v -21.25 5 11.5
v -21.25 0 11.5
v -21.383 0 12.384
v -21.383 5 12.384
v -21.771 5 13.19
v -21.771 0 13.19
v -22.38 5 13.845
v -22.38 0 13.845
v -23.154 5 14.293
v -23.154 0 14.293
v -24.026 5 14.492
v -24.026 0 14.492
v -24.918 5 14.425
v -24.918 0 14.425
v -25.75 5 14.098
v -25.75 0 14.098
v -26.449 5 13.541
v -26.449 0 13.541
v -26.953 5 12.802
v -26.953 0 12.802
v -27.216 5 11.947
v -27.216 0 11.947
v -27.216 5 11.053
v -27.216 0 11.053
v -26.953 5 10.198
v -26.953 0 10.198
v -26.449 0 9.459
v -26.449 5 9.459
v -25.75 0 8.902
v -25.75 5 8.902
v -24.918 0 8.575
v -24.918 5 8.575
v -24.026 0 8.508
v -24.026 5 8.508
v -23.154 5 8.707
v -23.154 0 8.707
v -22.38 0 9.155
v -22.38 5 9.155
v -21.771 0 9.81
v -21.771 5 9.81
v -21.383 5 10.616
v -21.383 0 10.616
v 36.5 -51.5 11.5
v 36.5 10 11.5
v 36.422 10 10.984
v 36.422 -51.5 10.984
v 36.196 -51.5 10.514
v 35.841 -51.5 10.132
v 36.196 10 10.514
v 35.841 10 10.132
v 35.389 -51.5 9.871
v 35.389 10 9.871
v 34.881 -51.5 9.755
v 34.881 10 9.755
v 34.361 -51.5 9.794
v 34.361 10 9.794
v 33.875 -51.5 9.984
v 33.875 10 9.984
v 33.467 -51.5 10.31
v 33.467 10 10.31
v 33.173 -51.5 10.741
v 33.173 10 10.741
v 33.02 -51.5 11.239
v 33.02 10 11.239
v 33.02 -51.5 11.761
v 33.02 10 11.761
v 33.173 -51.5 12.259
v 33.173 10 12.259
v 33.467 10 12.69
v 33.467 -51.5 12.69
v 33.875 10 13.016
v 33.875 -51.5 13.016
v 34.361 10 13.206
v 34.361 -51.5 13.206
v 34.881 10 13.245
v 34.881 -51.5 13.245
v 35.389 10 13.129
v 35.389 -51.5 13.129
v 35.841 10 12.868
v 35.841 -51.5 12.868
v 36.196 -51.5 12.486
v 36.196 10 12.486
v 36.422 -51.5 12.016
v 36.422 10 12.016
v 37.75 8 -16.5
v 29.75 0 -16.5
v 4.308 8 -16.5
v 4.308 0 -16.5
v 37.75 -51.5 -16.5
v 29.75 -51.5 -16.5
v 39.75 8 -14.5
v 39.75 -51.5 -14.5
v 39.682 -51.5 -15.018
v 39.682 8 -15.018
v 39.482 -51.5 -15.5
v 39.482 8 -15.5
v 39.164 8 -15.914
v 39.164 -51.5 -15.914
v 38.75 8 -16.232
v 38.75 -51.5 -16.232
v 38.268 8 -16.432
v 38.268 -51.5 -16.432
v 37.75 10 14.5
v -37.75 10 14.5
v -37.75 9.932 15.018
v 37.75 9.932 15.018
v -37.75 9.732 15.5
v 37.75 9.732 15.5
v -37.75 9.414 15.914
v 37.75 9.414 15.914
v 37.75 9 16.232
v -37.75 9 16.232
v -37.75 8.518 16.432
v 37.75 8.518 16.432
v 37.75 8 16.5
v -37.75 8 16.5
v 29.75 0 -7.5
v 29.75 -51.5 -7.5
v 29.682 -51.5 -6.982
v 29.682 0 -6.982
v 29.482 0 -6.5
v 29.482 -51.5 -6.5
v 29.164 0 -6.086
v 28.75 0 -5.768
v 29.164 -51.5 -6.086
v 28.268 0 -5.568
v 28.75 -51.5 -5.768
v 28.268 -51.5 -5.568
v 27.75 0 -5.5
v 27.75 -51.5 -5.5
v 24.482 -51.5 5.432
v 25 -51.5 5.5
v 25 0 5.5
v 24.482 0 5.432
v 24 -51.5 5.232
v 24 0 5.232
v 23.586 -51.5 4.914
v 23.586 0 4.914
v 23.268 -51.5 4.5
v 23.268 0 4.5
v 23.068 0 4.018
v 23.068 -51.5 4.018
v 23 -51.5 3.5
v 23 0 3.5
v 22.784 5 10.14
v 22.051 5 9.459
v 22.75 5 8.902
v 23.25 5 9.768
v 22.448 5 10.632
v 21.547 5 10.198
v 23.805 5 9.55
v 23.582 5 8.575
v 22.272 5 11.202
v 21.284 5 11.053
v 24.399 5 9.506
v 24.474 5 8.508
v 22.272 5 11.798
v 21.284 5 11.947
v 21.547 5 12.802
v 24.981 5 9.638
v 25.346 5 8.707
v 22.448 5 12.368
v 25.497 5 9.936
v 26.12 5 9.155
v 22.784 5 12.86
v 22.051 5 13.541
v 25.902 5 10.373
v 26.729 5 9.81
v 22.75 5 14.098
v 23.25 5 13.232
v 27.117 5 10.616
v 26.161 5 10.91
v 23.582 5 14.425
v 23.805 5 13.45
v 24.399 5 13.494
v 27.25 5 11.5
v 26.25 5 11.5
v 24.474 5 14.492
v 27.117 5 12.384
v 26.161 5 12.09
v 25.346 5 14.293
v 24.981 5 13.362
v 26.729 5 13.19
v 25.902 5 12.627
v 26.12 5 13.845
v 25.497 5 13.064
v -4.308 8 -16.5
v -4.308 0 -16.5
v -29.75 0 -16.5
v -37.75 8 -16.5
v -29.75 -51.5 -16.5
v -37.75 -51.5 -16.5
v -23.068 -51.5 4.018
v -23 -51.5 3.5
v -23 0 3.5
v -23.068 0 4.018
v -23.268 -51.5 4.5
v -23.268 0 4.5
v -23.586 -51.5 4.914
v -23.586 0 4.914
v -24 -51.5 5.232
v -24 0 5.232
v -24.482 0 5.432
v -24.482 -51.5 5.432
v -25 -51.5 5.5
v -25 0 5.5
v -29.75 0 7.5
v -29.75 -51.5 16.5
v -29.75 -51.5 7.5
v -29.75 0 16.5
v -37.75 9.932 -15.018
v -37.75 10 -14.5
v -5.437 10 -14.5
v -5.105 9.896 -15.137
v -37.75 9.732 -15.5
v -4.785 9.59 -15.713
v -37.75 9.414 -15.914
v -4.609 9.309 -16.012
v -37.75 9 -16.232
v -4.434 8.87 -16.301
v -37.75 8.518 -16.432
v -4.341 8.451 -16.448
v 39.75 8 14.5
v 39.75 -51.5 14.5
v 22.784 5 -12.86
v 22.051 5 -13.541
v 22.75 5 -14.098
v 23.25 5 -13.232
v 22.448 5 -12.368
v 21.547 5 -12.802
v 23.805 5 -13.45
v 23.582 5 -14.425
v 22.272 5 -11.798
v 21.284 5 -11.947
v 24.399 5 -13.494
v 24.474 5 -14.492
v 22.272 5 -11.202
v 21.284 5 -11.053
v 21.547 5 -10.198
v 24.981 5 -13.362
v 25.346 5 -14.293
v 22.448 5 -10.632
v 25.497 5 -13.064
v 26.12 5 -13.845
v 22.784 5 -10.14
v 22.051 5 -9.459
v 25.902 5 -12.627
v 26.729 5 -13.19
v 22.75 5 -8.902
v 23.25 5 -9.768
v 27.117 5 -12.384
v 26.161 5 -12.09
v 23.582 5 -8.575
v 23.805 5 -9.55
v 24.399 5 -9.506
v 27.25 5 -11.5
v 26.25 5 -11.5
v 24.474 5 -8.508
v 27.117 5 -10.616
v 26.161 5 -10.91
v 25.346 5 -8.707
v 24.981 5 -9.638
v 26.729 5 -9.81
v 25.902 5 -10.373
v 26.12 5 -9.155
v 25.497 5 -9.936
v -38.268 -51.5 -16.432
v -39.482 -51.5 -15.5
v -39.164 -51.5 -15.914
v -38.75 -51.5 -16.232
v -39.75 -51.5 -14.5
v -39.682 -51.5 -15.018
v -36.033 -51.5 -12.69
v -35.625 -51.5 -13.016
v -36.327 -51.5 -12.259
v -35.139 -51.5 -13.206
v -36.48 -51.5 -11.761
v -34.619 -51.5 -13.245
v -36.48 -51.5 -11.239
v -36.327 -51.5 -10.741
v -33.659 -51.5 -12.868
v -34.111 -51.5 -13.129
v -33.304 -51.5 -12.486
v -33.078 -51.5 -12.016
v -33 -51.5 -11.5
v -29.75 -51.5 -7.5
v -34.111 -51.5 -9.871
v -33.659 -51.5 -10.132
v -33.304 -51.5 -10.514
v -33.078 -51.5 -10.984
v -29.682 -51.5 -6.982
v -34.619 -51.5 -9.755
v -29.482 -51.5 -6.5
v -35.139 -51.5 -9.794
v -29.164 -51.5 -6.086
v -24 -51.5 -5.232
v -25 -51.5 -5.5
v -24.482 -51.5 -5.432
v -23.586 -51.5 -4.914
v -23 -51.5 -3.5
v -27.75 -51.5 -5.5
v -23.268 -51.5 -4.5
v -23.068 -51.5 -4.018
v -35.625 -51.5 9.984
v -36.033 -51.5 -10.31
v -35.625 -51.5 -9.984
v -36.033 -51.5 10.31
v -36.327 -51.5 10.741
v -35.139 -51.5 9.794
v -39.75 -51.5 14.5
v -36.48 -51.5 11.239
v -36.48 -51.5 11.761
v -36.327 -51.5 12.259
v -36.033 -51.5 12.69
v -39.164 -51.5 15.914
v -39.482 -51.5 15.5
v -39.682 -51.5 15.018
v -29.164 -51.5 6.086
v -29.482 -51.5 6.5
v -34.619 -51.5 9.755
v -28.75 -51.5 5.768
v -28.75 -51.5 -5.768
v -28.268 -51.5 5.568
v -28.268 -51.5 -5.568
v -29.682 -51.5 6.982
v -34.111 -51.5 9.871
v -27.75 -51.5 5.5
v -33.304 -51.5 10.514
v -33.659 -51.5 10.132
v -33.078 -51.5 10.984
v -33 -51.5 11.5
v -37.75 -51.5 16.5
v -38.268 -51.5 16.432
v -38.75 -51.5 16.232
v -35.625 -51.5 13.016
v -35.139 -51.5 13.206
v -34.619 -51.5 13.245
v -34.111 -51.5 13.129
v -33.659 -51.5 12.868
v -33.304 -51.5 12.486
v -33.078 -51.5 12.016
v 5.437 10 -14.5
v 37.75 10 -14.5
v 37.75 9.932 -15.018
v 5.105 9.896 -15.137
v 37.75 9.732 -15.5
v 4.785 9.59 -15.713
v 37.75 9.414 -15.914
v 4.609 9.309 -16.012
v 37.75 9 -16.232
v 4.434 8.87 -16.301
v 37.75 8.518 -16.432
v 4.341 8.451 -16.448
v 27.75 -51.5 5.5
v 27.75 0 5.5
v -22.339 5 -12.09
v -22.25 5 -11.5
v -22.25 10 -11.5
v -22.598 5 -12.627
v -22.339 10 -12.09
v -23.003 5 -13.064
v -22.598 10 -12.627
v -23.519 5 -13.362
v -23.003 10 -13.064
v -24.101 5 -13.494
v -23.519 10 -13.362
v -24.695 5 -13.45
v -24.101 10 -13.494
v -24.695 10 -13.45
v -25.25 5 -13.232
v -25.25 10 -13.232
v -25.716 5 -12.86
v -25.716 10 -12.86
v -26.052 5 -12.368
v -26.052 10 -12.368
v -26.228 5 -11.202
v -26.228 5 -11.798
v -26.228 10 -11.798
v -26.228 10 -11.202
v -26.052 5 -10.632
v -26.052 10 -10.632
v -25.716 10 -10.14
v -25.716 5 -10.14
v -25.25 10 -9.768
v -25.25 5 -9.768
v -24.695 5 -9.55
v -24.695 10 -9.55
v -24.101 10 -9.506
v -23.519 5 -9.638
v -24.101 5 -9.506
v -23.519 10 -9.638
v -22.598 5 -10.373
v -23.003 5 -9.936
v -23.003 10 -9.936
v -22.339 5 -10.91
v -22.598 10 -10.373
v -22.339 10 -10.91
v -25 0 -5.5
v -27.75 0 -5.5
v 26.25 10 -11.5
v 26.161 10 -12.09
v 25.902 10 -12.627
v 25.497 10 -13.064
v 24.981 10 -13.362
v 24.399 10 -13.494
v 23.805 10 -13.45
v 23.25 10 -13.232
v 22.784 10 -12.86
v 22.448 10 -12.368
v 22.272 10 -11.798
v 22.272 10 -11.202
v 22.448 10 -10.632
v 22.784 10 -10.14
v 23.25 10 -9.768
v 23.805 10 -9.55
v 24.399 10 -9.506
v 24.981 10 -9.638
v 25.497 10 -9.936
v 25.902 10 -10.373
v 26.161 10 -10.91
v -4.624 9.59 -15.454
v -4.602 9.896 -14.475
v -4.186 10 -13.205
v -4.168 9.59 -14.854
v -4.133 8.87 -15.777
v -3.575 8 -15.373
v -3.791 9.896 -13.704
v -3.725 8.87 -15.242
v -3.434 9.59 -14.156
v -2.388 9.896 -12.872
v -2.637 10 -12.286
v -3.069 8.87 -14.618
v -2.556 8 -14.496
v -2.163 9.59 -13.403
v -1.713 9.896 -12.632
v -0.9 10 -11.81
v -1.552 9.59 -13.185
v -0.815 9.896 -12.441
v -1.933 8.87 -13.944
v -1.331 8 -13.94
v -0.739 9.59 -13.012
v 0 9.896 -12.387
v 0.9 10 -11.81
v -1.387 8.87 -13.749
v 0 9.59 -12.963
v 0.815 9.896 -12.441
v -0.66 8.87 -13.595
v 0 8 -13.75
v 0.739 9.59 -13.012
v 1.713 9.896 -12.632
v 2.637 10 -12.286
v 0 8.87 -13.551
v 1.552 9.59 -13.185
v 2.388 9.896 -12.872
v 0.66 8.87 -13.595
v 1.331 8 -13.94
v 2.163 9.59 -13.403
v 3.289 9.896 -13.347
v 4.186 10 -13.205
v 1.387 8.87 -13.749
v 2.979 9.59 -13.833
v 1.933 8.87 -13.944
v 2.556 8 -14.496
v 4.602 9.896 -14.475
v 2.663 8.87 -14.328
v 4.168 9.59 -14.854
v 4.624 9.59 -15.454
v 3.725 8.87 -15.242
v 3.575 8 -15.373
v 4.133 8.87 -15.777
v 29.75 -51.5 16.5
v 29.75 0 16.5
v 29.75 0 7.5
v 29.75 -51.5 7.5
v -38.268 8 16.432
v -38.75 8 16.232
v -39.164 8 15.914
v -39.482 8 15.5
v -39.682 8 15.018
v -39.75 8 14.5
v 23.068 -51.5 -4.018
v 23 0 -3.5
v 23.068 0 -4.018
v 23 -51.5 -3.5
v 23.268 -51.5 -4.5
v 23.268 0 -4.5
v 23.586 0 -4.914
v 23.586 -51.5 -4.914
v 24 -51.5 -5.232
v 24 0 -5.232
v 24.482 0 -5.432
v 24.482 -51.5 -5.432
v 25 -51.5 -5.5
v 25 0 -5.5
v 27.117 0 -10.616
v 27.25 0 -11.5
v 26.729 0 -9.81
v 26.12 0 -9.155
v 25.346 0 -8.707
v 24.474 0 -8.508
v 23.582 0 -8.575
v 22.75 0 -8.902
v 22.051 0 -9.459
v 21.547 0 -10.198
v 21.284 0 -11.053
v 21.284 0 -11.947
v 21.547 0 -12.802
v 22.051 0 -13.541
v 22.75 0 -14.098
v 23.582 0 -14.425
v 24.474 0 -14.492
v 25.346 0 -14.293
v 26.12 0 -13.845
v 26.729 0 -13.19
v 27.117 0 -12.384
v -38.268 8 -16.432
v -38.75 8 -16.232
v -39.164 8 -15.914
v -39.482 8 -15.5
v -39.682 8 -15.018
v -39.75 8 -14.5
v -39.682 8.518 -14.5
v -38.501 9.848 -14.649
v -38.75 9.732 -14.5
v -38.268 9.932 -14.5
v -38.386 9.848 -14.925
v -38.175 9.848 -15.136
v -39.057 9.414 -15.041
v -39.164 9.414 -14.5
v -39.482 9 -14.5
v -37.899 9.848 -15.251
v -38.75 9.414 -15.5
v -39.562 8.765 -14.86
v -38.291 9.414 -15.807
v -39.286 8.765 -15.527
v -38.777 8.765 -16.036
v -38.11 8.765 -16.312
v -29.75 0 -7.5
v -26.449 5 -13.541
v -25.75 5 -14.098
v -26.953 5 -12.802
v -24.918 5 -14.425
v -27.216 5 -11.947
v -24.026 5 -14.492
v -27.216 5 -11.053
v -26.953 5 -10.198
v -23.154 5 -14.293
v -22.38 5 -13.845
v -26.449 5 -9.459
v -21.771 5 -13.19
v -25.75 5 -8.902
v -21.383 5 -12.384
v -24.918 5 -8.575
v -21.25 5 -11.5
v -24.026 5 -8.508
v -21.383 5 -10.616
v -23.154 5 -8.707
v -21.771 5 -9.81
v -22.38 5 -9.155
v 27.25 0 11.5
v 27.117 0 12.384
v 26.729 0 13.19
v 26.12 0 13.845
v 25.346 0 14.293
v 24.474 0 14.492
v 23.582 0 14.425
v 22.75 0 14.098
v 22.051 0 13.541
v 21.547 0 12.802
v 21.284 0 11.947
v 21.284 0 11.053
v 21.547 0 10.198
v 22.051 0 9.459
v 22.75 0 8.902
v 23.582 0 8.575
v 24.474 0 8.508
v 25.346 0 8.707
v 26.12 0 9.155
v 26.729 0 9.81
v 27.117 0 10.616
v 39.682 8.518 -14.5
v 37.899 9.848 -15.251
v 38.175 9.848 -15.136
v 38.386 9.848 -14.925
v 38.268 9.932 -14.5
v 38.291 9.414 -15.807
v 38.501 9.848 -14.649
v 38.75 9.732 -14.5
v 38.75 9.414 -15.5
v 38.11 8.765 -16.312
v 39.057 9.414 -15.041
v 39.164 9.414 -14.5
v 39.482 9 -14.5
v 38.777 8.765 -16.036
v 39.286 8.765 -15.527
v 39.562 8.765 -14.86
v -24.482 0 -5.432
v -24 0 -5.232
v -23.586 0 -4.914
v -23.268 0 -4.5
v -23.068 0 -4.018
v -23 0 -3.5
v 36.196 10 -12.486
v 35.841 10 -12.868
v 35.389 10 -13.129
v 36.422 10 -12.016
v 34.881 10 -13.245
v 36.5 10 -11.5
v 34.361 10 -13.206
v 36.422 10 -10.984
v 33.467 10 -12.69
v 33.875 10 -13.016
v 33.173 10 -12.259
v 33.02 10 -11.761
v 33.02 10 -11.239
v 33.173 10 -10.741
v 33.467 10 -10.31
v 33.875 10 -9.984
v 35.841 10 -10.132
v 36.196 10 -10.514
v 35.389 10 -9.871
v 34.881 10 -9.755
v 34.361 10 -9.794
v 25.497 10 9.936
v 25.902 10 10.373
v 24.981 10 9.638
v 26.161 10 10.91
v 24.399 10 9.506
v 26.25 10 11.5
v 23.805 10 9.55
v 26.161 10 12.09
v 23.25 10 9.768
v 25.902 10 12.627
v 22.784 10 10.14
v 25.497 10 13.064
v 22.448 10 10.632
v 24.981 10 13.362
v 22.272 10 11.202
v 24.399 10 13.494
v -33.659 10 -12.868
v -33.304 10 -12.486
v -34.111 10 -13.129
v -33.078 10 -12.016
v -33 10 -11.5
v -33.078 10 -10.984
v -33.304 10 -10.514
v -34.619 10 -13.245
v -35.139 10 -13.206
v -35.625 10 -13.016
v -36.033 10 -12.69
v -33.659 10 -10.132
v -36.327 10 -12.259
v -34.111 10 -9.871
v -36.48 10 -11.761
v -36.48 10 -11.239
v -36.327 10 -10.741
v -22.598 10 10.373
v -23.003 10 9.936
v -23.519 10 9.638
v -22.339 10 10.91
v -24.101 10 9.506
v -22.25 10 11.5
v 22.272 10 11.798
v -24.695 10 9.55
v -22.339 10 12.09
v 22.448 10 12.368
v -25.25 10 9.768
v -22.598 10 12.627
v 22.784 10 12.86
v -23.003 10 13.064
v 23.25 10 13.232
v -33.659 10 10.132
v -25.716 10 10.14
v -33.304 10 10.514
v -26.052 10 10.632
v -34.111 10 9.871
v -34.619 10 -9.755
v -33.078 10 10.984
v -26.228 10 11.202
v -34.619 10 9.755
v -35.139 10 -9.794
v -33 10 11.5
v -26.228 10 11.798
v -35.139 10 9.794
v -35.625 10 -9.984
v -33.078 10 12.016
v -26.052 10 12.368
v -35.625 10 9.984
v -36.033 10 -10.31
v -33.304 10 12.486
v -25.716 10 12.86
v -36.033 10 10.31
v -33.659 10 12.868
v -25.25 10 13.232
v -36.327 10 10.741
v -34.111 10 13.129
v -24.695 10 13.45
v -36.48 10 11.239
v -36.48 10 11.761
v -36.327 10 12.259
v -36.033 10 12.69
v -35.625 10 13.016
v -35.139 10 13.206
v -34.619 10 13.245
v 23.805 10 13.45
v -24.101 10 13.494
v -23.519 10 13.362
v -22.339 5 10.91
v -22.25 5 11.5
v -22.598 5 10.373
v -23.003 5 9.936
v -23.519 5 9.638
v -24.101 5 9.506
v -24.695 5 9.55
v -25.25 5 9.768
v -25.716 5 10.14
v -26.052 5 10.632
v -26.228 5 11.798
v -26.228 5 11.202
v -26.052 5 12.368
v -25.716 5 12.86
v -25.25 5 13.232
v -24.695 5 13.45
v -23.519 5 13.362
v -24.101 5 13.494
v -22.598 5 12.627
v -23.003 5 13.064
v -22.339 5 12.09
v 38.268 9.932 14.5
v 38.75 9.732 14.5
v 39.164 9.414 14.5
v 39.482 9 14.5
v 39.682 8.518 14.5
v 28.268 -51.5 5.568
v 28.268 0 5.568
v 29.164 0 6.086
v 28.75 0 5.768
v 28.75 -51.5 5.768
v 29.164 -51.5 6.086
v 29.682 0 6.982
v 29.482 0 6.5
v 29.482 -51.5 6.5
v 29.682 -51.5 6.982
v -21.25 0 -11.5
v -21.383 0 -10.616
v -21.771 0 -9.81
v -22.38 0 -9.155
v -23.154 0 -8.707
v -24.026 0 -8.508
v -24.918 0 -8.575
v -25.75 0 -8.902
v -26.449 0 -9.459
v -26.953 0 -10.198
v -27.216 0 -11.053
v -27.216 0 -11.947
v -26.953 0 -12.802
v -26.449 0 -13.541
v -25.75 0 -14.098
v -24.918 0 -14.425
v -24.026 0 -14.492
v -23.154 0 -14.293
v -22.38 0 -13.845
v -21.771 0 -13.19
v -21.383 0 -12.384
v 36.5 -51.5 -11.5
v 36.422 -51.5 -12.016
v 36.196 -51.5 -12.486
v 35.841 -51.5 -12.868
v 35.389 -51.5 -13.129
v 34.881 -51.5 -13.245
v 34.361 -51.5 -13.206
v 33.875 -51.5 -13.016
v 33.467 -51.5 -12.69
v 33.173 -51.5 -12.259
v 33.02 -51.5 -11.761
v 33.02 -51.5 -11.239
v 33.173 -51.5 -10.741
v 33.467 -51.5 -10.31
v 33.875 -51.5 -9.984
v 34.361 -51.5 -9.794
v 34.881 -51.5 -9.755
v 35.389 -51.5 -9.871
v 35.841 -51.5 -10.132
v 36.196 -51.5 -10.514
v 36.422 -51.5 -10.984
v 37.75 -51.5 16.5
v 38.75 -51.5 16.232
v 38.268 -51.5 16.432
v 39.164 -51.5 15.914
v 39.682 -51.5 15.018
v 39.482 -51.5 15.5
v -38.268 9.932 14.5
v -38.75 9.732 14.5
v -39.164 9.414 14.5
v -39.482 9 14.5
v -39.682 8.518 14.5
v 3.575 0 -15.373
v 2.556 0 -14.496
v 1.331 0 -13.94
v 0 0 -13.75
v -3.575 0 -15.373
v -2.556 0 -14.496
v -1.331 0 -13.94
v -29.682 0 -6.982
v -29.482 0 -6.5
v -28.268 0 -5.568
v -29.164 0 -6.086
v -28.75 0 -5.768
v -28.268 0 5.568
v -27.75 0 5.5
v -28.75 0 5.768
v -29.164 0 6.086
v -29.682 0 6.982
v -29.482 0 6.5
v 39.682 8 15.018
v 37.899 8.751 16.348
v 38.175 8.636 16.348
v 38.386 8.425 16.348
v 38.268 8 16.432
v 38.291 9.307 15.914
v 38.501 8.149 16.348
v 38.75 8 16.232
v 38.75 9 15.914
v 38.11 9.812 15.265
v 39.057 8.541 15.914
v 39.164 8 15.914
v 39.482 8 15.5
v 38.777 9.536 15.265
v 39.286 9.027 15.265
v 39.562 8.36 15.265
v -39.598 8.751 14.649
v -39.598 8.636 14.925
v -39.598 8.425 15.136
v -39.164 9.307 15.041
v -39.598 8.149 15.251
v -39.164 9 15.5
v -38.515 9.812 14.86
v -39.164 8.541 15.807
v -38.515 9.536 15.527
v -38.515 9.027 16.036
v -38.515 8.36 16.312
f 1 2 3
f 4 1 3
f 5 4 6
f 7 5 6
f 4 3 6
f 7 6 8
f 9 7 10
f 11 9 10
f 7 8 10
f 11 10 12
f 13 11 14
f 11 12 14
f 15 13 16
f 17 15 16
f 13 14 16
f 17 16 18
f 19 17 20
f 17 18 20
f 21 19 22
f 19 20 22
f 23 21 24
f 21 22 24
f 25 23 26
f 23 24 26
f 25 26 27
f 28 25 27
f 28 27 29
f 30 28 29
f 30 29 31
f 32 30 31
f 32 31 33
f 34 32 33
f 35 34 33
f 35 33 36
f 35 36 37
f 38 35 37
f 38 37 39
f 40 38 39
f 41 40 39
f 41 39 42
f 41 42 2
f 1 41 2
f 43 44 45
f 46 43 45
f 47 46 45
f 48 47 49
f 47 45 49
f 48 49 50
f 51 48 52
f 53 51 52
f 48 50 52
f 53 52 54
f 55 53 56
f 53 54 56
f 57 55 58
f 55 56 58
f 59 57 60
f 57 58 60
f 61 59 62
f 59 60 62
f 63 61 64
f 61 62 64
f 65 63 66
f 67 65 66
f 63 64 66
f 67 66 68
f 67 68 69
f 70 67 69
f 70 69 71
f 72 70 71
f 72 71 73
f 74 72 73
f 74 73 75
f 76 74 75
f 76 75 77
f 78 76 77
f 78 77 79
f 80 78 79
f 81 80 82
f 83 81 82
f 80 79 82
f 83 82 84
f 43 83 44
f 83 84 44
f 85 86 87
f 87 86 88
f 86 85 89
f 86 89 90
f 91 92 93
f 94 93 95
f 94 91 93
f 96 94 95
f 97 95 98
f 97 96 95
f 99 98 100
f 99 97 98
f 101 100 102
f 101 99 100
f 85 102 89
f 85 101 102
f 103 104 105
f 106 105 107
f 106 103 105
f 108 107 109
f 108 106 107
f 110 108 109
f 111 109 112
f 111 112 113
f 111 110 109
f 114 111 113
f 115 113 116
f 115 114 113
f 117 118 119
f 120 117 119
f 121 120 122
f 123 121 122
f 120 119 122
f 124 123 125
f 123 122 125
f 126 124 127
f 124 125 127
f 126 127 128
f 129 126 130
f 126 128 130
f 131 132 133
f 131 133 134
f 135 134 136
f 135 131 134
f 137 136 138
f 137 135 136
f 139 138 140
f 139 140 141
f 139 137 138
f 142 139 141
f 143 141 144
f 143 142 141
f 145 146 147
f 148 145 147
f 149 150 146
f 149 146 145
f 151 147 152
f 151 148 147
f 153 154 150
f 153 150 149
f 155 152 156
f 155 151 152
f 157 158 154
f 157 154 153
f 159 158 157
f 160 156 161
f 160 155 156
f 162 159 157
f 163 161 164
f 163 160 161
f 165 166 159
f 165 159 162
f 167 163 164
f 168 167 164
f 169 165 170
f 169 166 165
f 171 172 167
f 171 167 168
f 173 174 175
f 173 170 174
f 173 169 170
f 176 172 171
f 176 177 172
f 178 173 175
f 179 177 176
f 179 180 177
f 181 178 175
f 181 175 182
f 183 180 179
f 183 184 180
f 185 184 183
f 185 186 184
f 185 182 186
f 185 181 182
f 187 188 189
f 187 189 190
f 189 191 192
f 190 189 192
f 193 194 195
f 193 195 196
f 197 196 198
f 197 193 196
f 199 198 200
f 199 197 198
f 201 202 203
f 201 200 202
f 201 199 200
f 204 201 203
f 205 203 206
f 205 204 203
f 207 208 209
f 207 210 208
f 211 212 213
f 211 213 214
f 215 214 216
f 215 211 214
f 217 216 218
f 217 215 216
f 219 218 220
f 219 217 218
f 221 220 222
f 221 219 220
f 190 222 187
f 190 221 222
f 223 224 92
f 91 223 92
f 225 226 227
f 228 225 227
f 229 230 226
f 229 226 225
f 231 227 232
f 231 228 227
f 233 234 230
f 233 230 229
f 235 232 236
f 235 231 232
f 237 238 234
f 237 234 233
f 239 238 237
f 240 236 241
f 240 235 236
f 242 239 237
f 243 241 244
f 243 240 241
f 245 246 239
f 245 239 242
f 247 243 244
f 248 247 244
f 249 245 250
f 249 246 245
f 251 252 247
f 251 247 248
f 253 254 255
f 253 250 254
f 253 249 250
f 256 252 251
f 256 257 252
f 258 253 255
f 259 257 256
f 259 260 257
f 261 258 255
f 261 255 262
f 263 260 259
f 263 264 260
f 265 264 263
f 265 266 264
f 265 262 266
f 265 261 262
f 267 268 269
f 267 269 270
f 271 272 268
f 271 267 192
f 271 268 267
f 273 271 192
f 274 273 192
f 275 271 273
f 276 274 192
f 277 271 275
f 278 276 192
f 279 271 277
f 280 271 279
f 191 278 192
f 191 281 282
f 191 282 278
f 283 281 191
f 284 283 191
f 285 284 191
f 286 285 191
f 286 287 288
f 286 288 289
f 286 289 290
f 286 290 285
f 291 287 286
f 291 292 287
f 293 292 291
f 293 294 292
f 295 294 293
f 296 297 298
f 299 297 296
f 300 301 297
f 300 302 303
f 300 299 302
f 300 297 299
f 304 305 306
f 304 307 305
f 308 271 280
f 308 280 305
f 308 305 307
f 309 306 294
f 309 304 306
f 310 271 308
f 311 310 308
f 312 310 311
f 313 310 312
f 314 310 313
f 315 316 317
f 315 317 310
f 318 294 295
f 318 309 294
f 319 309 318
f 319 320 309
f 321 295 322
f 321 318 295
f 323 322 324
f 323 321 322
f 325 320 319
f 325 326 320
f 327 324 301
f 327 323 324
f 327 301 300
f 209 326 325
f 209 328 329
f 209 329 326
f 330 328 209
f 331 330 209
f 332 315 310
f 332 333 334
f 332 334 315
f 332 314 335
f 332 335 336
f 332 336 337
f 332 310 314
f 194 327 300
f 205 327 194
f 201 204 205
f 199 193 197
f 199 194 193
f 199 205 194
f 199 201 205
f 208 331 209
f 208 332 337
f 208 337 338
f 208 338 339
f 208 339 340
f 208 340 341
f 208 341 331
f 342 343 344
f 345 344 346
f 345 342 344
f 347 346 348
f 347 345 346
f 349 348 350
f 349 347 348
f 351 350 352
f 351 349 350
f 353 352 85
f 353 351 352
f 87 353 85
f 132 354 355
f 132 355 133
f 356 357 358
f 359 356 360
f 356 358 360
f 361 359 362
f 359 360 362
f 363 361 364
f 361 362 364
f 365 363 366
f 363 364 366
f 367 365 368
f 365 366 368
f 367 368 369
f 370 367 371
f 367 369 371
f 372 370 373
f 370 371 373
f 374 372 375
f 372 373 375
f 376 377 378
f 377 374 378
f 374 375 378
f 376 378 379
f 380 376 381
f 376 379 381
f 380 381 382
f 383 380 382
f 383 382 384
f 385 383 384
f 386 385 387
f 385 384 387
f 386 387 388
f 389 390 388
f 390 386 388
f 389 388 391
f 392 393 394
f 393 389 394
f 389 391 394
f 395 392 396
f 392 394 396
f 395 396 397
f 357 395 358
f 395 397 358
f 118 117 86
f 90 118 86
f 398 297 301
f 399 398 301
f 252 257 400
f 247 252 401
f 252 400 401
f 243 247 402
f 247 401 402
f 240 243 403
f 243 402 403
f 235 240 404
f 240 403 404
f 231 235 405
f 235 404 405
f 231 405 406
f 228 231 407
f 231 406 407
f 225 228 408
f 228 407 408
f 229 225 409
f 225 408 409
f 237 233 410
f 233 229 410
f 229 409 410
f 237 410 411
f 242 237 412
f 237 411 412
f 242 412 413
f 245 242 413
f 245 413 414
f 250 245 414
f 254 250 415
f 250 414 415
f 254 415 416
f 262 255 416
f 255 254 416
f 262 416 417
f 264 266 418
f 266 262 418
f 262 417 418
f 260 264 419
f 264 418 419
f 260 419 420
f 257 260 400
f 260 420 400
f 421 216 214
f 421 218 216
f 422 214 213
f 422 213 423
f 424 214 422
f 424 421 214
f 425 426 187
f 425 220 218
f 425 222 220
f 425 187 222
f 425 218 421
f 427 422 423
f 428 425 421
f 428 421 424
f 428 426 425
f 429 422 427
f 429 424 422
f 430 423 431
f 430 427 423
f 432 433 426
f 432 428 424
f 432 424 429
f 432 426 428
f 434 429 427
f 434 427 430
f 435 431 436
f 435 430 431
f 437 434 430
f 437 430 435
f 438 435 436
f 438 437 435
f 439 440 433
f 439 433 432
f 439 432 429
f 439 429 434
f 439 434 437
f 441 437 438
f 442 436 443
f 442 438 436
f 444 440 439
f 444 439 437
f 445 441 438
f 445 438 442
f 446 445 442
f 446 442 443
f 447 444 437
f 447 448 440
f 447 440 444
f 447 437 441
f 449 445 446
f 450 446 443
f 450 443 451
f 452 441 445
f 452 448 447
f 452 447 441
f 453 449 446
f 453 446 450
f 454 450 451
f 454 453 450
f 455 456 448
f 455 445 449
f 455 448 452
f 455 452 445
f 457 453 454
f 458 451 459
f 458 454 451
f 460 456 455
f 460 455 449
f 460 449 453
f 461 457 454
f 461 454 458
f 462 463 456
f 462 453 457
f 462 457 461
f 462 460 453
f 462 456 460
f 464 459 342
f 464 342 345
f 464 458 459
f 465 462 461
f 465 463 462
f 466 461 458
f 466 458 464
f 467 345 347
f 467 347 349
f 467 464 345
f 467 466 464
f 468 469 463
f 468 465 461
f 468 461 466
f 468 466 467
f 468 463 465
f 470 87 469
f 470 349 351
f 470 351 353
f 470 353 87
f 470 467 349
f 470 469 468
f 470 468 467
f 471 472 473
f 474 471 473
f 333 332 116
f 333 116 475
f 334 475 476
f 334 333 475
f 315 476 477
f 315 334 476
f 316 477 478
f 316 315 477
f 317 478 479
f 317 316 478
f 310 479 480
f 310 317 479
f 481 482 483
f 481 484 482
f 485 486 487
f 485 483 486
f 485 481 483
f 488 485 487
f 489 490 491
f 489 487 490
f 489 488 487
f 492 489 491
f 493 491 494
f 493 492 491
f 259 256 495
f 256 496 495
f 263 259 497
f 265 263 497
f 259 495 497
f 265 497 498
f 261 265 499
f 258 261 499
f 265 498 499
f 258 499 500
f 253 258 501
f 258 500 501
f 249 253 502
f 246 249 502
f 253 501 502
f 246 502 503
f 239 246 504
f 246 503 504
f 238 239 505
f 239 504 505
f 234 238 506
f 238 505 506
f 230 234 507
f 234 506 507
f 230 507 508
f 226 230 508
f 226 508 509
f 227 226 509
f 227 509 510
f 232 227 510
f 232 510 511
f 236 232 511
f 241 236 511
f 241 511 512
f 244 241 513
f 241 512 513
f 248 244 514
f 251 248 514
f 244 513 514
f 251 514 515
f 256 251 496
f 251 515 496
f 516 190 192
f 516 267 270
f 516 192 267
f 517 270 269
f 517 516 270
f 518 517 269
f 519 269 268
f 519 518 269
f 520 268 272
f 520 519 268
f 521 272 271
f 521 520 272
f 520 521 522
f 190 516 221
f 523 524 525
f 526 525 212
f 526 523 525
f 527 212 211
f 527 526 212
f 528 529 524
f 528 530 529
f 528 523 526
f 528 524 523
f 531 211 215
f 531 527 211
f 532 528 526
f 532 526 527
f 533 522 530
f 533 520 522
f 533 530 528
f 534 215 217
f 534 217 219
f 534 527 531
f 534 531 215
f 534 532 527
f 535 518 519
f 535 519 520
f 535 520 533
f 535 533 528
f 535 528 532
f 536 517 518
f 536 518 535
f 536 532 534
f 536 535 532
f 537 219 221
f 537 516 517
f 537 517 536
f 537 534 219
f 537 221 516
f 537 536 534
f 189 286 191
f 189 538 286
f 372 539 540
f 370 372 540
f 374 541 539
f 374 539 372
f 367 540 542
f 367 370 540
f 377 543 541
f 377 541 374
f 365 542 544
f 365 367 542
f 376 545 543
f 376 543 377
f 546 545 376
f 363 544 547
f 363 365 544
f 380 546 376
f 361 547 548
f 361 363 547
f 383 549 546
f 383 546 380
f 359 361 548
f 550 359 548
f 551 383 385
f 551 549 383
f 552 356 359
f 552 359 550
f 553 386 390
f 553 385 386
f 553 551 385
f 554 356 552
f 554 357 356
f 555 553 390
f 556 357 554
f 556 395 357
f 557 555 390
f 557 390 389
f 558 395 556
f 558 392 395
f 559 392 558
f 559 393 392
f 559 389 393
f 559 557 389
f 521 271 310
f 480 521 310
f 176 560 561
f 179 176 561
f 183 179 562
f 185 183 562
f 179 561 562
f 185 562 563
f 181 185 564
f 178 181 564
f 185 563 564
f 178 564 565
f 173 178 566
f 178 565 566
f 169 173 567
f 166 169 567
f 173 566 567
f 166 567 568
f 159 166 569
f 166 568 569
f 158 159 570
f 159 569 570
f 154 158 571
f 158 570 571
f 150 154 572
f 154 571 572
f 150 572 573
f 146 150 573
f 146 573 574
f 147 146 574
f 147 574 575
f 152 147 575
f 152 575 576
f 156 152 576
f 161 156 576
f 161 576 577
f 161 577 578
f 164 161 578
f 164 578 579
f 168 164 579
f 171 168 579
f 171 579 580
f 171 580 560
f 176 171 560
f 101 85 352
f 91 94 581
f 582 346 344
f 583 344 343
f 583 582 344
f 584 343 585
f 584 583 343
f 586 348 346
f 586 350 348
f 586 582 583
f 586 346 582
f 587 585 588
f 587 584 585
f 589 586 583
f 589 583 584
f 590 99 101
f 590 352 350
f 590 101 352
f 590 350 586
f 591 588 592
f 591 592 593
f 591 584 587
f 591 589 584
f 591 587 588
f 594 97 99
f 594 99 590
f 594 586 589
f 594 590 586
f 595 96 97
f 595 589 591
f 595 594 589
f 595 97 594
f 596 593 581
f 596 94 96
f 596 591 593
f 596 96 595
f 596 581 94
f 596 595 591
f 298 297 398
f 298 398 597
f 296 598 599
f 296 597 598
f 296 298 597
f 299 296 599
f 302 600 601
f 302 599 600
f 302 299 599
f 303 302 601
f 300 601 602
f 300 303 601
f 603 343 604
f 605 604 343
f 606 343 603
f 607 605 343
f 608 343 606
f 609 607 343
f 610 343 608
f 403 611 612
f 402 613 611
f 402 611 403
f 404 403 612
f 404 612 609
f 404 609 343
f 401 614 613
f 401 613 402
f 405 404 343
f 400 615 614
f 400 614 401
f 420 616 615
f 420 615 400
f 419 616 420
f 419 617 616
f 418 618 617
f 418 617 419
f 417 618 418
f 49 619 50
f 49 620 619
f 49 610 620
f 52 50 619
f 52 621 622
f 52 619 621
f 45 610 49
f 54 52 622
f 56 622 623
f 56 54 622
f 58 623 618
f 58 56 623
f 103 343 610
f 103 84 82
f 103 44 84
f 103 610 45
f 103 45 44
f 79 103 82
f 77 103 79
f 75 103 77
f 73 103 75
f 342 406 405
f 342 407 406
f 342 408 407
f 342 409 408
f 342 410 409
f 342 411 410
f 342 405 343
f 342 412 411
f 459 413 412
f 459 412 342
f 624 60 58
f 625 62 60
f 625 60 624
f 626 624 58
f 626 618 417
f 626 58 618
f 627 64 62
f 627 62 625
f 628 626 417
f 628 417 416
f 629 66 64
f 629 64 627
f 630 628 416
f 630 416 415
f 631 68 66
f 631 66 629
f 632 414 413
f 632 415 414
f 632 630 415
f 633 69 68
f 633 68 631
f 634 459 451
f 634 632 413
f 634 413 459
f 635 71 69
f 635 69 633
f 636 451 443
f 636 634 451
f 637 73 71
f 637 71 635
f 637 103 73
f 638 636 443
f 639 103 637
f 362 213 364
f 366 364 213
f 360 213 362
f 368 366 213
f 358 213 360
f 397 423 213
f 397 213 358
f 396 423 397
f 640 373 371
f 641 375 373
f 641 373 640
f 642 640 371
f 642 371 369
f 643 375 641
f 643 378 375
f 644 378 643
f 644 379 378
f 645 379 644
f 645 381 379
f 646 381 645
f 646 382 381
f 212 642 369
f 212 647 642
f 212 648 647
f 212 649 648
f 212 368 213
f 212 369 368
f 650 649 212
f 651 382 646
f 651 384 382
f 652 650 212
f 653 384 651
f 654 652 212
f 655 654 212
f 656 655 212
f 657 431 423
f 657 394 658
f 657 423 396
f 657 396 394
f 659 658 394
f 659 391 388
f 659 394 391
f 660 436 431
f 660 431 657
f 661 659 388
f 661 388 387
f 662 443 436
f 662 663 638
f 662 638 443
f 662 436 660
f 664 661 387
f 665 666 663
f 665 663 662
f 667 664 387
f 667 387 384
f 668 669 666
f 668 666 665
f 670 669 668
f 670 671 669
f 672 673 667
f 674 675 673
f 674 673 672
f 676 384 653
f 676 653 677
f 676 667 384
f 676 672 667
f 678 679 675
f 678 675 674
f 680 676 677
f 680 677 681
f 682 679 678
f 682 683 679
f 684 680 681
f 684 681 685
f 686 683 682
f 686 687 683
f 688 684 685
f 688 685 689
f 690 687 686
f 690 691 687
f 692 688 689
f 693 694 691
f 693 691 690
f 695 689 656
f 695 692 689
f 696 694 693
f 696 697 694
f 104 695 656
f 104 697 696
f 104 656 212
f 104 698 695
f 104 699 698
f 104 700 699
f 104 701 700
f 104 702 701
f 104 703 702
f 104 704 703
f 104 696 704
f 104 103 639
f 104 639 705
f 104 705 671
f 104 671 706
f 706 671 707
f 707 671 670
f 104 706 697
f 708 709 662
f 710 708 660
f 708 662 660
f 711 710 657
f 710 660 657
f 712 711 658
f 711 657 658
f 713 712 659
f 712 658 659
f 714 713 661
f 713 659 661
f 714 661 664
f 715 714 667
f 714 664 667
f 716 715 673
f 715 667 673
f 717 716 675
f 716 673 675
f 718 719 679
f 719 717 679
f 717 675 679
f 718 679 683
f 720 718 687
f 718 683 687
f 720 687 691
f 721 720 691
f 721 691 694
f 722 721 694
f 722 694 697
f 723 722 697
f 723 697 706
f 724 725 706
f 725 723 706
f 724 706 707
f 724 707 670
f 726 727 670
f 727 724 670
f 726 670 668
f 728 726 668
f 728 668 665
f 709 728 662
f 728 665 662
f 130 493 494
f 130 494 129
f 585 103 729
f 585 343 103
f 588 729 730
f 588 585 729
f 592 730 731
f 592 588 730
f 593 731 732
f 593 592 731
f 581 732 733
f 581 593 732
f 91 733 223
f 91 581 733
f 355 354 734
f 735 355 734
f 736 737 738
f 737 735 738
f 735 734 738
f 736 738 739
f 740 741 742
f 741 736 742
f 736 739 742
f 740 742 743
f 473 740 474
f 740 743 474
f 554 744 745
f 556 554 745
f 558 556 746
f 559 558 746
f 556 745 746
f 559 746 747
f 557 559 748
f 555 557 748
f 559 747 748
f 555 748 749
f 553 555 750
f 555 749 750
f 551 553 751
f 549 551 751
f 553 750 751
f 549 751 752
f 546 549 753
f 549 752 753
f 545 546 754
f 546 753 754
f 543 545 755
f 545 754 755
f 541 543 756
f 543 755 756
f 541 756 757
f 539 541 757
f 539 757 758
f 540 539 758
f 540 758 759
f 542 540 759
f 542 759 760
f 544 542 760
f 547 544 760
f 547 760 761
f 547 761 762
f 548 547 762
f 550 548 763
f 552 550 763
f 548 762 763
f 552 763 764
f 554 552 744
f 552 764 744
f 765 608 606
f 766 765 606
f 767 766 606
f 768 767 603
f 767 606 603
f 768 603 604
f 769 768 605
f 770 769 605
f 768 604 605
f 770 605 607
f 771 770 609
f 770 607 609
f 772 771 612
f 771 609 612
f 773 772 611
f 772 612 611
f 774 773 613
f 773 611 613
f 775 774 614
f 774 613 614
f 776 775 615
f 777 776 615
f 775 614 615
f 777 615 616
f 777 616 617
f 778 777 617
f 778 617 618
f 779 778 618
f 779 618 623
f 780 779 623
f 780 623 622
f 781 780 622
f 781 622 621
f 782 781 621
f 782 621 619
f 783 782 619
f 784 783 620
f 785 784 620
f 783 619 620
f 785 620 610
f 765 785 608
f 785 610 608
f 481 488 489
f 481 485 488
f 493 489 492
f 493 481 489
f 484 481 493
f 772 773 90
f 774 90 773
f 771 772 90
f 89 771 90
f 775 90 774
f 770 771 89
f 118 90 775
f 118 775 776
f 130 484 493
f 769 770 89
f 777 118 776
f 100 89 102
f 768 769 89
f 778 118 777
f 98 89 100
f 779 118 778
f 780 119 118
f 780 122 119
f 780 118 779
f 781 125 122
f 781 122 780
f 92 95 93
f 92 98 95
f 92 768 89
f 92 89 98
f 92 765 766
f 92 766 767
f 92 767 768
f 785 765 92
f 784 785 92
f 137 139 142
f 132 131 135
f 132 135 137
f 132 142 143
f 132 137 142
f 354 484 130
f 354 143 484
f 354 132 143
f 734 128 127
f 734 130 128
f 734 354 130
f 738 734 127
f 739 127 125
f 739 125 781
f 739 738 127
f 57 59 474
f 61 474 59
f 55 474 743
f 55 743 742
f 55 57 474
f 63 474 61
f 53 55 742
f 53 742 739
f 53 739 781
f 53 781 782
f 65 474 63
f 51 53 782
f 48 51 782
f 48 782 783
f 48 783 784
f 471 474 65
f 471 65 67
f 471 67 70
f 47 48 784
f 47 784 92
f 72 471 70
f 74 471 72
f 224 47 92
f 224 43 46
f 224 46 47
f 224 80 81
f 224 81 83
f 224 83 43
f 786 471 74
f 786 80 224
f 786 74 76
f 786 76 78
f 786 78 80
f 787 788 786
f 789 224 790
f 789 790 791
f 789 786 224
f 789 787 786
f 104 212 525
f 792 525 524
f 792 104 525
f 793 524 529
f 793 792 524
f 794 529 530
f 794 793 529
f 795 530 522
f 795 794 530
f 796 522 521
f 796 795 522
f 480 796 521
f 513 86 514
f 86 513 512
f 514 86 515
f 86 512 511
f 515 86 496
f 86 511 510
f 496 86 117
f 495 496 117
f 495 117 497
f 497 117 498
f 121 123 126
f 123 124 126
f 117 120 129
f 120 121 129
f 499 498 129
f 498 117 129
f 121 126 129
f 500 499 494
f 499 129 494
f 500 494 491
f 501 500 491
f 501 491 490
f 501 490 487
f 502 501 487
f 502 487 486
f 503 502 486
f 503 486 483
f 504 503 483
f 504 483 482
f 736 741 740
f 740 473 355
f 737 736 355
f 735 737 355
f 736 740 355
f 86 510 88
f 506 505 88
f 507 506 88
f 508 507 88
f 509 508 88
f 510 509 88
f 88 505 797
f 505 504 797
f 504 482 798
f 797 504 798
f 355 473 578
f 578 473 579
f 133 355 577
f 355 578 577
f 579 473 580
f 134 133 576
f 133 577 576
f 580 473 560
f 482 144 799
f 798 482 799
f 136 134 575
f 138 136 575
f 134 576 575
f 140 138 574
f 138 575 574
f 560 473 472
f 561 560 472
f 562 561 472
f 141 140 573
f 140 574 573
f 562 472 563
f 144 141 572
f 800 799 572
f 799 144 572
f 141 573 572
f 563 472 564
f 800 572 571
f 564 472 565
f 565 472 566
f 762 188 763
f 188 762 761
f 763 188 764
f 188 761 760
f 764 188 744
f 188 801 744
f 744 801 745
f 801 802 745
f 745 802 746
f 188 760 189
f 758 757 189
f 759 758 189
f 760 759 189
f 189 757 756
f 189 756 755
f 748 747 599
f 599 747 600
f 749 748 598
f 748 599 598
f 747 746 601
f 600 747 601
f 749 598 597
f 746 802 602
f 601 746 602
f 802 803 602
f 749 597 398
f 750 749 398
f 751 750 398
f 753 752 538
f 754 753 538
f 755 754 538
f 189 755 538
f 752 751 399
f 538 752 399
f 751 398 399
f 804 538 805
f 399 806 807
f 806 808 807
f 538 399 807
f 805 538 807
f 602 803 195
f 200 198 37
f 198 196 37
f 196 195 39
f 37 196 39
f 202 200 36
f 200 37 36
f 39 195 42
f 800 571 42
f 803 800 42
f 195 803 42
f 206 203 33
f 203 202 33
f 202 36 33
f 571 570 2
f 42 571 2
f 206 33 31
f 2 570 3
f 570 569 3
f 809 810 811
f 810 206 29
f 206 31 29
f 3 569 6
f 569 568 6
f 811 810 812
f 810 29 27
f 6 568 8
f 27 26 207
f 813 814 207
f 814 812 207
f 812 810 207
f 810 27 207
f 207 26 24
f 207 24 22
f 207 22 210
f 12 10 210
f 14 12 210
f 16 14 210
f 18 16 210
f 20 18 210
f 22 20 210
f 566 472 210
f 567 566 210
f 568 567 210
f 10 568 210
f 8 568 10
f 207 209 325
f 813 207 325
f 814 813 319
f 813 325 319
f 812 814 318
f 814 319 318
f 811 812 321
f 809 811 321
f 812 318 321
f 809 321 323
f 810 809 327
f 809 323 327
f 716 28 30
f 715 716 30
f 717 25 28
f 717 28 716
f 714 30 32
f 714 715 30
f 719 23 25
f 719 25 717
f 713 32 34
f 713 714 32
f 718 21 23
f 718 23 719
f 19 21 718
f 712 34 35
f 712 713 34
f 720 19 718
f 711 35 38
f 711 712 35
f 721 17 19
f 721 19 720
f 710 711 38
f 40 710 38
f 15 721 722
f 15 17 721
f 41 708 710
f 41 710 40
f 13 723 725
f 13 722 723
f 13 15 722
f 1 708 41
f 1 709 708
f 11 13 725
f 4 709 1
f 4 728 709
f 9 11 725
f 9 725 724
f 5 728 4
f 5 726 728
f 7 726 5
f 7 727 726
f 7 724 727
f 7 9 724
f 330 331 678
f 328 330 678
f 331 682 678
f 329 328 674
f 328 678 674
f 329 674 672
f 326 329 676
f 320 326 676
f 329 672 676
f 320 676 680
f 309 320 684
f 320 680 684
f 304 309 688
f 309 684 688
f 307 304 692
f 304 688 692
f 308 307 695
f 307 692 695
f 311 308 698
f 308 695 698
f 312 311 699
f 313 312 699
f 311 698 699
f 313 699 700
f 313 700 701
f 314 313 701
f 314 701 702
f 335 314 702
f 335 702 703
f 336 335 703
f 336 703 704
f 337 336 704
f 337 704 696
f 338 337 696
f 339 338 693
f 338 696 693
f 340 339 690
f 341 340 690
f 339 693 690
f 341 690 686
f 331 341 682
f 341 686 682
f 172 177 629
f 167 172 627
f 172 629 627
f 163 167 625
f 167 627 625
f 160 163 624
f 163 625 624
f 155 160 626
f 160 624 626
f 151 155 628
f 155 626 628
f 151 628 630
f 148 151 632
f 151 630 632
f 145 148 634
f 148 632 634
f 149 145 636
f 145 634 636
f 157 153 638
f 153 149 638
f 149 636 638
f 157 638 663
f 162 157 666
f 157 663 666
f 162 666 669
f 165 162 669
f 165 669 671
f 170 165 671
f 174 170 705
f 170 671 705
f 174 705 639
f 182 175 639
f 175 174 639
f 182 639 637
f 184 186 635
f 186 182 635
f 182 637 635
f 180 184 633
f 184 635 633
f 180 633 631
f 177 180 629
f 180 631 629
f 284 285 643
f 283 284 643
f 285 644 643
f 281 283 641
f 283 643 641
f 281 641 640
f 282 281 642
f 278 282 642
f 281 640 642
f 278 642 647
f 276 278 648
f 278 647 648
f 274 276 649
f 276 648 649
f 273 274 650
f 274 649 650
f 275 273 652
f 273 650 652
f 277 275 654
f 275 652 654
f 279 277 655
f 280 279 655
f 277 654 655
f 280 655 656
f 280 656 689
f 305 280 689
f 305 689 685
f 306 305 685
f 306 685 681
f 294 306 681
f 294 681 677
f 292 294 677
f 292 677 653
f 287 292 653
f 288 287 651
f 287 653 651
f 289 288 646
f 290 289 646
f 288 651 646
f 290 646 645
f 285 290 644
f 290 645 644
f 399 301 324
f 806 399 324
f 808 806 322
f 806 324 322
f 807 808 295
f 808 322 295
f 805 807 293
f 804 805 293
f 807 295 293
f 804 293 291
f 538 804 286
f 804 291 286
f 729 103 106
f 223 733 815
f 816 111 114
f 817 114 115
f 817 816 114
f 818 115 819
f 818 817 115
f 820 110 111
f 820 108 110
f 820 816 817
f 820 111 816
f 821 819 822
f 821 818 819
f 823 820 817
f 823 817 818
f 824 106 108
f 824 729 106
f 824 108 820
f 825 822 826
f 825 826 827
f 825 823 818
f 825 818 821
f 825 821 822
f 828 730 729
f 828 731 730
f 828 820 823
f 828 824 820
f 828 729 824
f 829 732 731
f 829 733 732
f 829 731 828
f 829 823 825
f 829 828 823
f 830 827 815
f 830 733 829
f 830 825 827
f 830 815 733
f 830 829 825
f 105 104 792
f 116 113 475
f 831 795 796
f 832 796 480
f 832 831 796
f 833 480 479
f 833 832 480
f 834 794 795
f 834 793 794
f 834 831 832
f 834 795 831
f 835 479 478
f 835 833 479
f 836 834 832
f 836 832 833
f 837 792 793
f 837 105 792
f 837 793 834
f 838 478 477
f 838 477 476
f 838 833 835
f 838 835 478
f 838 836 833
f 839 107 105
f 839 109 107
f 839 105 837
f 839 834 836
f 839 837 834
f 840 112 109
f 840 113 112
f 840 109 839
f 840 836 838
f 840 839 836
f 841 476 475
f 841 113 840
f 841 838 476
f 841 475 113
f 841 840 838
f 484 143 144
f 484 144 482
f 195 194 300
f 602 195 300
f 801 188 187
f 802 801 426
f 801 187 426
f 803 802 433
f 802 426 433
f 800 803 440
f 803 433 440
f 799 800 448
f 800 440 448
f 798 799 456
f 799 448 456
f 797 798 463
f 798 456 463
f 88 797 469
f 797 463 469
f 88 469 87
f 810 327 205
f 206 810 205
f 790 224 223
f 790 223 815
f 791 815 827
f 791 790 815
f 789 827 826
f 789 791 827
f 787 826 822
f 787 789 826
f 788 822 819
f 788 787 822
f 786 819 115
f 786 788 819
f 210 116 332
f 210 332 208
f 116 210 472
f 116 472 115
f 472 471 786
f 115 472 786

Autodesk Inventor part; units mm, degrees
ref_plane "YZ Plane" through (0, 0, 0) normal (1, 0, 0) x (0, 1, 0)
ref_plane "XZ Plane" through (0, 0, 0) normal (0, 1, 0) x (-1, 0, 0)
ref_plane "XY Plane" through (0, 0, 0) normal (0, 0, 1) x (1, 0, 0)
sketch "TopSketch" plane through (0, 0, 0) normal (0, 1, 0) x (-1, 0, 0)
  line L0 (-39.75, -16.5) -> (39.75, -16.5)
  line L1 (39.75, -16.5) -> (39.75, 16.5)
  line L2 (39.75, 16.5) -> (-39.75, 16.5)
  line L3 (-39.75, 16.5) -> (-39.75, -16.5)
  line L4 (-39.75, -16.5) -> (39.75, 16.5) construction
  line L5 (39.75, -16.5) -> (-39.75, 16.5) construction
  point P0 (0, 0)
  dimension "EncoderSupportOutside_Length" = 33
  dimension "EncoderSupportOutside_Width" = 79.5
extrude "Top" add sketch "TopSketch" along normal blind 10
sketch "SideSketch" plane through (0, 0, 0) normal (0, -1, 0) x (1, 0, 0)
  line L0 (39.75, -16.5) -> (-39.75, -16.5) projected
  line L1 (39.75, 16.5) -> (39.75, -16.5) projected
  line L2 (-39.75, 16.5) -> (39.75, 16.5) projected
  line L3 (-39.75, -16.5) -> (-39.75, 16.5) projected
  line L4 (-29.75, 16.5) -> (-29.75, -16.5)
  line L5 (29.75, 16.5) -> (29.75, -16.5)
  line L6 (0, 0) -> (0, 21.6169) construction
  dimension "d4" = 10
extrude "Side" add sketch "SideSketch" along normal blind 51.5 contours L0 L5 L2 L1 | L0 L3 L2 L4
sketch "CableHoleSketch" plane through (0, 10, 0) normal (0, 1, 0) x (1, 0, 0)
  line L0 (-39.75, -16.5) -> (39.75, -16.5) projected
  line L1 (39.75, -16.5) -> (39.75, 16.5) projected
  line L2 (0, 0) -> (0, 14.5107) construction
  circle A0 centre (0, 18.5) radius 4.75
  dimension "d7" = 9.5
  dimension "d8" = 35
extrude "CableHole" cut sketch "CableHoleSketch" against normal up to next
sketch "InnerFasteningHoleSketch" plane through (0, 10, 0) normal (0, 1, 0) x (1, 0, 0)
  line L0 (39.75, 16.5) -> (-39.75, 16.5) projected
  line L1 (39.75, 16.5) -> (-39.75, 16.5) projected
  circle A0 centre (-24.25, 11.5) radius 2
  line L2 (0, 0) -> (39.099, 0) construction
  line L3 (0, 0) -> (0, 35.9734) construction
  circle A1 centre (-24.25, -11.5) radius 2
  circle A2 centre (24.25, 11.5) radius 2
  circle A3 centre (24.25, -11.5) radius 2
  dimension "d11" = 4
  dimension "d12" = 5
  dimension "d13" = 24.25
extrude "InnerFasteningHole" cut sketch "InnerFasteningHoleSketch" against normal up to next
sketch "OuterFasteningHoleSketch" plane through (0, 10, 0) normal (0, 1, 0) x (1, 0, 0)
  line L0 (39.75, 16.5) -> (-39.75, 16.5) projected
  line L1 (-39.75, 16.5) -> (-39.75, -16.5) projected
  line L2 (39.75, 16.5) -> (-39.75, 16.5) projected
  circle A0 centre (-34.75, 11.5) radius 1.75
  line L3 (0, 0) -> (36.9685, 0) construction
  line L4 (0, 0) -> (0, 24.5431) construction
  circle A1 centre (34.75, 11.5) radius 1.75
  circle A2 centre (-34.75, -11.5) radius 1.75
  circle A3 centre (34.75, -11.5) radius 1.75
  dimension "d16" = 3.5
  dimension "d17" = 5
  dimension "d18" = 5
extrude "OuterFasteningHole" cut sketch "OuterFasteningHoleSketch" against normal up to next
sketch "CoilSpringHoleSketch" plane through (0, 0, 0) normal (0, -1, 0) x (1, 0, 0)
  circle A0 centre (24.25, -11.5) radius 2 projected
  circle A1 centre (-24.25, -11.5) radius 2 projected
  circle A2 centre (-24.25, 11.5) radius 2 projected
  circle A3 centre (24.25, 11.5) radius 2 projected
  line L0 (29.75, -16.5) -> (-29.75, -16.5) projected
  circle A4 centre (-24.25, 11.5) radius 3
  line L1 (0, 0) -> (0, 23.1959) construction
  line L2 (0, 0) -> (47.7515, 0) construction
  circle A5 centre (24.25, 11.5) radius 3
  circle A6 centre (-24.25, -11.5) radius 3
  circle A7 centre (24.25, -11.5) radius 3
  point P0 (-4.3084, -16.5)
  dimension "d21" = 6
extrude "CoilSpringHole" cut sketch "CoilSpringHoleSketch" against normal blind 5
sketch "Sketch7" plane through (0, 0, 0) normal (0, -1, 0) x (1, 0, 0)
  circle A0 centre (-24.25, 11.5) radius 3 projected
  arc A1 (4.3084, -16.5) -> (-4.3084, -16.5) centre (0, -18.5) ccw projected
  line L0 (-29.75, 16.5) -> (-29.75, -16.5) projected
  line L1 (-29.75, 5.5) -> (-23, 5.5)
  line L2 (-23, 5.5) -> (-23, -5.5)
  line L3 (-23, -5.5) -> (-29.75, -5.5)
  line L4 (-29.75, -5.5) -> (-29.75, 5.5)
  line L5 (0, 0) -> (50.1862, 0) construction
  line L6 (0, 0) -> (0, -18.5) construction
  line L7 (29.75, 5.5) -> (23, 5.5)
  line L8 (23, 5.5) -> (23, -5.5)
  line L9 (23, -5.5) -> (29.75, -5.5)
  line L10 (29.75, -5.5) -> (29.75, 5.5)
  circle A2 centre (-24.25, 11.5) radius 3 construction
  dimension "d25" = 3
  dimension "d26" = 23
extrude "Extrusion7" add sketch "Sketch7" along normal up to surface (51.5 mm away) contours L1 L2 L3 L0 | L10 L9 L8 L7
fillet "Fillet" radius 2 8 edges at (-29.75, -25.75, 5.5) (-23, -25.75, 5.5) (-23, -25.75, -5.5) (-29.75, -25.75, -5.5) (29.75, -25.75, 5.5) (23, -25.75, 5.5) (23, -25.75, -5.5) (29.75, -25.75, -5.5)
fillet "Fillet" radius 2 10 edges at (39.75, -20.75, -16.5) (-39.75, -20.75, -16.5) (22.0292, 10, -16.5) (0, 10, -13.75) (-22.0292, 10, -16.5) (39.75, 10, 0) (0, 10, 16.5) (-39.75, 10, 0) (-39.75, -20.75, 16.5) (39.75, -20.75, 16.5)
equation "\"EncoderSupportOutside_Length\" = EncoderSupportInside_Length"
equation "\"EncoderSupportOutside_Width\" = EncoderSupportInside_Width + 2 * EncoderSupportOutside_Thickness + 2 * EncoderSupportOutside_MecanicalSpace"
equation "\"d2\" = EncoderSupportOutside_Thickness"
equation "\"d4\" = EncoderSupportOutside_Thickness"
equation "\"d5\" = EncoderSupportInside_Height + EncoderSupport_Space"
equation "\"d7\" = Encoder_CableBase_Diameter + EncoderSupport_PlasticShrinkingMargin"
equation "\"d8\" = Encoder_CableBase_DistanceToTop + EncoderSupportInside_Front_Thickness"
equation "\"d9\" = EncoderSupportOutside_Thickness"
equation "\"d11\" = EncoderSupport_PlasticShrinkingMargin + EncoderSupport_FixingHole_Diameter + EncoderSupportOutside_MecanicalSpace"
equation "\"d12\" = EncoderSupport_FixingnHole_Margin"
equation "\"d14\" = EncoderSupportOutside_Thickness"
equation "\"d16\" = EncoderSupport_FixingHole_Diameter + EncoderSupport_PlasticShrinkingMargin"
equation "\"d17\" = EncoderSupport_FixingnHole_Margin"
equation "\"d18\" = EncoderSupport_FixingnHole_Margin"
equation "\"d19\" = EncoderSupportOutside_Thickness"
equation "\"d21\" = EncoderSupport_CoilSpringHole_Diameter"
equation "\"d25\" = EncoderSupportInside_Hollow_Margin + EncoderSupportOutside_MecanicalSpace"
equation "\"d29\" = EncoderSupport_Fillet_Size"
equation "\"EncoderSupportOutside_Thickness\" = 10"
equation "\"EncoderSupportOutside_MecanicalSpace\" = 0.5"
equation "\"EncoderSupport_Space\" = 5"
equation "\"EncoderSupportInside_Length\" = 33"
equation "\"EncoderSupportInside_Width\" = 58.5"
equation "\"EncoderSupportInside_Height\" = 46.5"
equation "\"Encoder_CableBase_Diameter\" = 9"
equation "\"EncoderSupport_PlasticShrinkingMargin\" = 0.5"
equation "\"Encoder_CableBase_DistanceToTop\" = 32"
equation "\"EncoderSupportInside_Front_Thickness\" = 3"
equation "\"EncoderSupport_FixingHole_Diameter\" = 3"
equation "\"EncoderSupport_FixingnHole_Margin\" = 5"
equation "\"EncoderSupport_CoilSpringHole_Diameter\" = 6"
equation "\"EncoderSupportInside_Hollow_Margin\" = 2.5"
equation "\"EncoderSupport_Fillet_Size\" = 2"
properties part number "EncoderSupportOutside" material "Polyethylene, High Density"
